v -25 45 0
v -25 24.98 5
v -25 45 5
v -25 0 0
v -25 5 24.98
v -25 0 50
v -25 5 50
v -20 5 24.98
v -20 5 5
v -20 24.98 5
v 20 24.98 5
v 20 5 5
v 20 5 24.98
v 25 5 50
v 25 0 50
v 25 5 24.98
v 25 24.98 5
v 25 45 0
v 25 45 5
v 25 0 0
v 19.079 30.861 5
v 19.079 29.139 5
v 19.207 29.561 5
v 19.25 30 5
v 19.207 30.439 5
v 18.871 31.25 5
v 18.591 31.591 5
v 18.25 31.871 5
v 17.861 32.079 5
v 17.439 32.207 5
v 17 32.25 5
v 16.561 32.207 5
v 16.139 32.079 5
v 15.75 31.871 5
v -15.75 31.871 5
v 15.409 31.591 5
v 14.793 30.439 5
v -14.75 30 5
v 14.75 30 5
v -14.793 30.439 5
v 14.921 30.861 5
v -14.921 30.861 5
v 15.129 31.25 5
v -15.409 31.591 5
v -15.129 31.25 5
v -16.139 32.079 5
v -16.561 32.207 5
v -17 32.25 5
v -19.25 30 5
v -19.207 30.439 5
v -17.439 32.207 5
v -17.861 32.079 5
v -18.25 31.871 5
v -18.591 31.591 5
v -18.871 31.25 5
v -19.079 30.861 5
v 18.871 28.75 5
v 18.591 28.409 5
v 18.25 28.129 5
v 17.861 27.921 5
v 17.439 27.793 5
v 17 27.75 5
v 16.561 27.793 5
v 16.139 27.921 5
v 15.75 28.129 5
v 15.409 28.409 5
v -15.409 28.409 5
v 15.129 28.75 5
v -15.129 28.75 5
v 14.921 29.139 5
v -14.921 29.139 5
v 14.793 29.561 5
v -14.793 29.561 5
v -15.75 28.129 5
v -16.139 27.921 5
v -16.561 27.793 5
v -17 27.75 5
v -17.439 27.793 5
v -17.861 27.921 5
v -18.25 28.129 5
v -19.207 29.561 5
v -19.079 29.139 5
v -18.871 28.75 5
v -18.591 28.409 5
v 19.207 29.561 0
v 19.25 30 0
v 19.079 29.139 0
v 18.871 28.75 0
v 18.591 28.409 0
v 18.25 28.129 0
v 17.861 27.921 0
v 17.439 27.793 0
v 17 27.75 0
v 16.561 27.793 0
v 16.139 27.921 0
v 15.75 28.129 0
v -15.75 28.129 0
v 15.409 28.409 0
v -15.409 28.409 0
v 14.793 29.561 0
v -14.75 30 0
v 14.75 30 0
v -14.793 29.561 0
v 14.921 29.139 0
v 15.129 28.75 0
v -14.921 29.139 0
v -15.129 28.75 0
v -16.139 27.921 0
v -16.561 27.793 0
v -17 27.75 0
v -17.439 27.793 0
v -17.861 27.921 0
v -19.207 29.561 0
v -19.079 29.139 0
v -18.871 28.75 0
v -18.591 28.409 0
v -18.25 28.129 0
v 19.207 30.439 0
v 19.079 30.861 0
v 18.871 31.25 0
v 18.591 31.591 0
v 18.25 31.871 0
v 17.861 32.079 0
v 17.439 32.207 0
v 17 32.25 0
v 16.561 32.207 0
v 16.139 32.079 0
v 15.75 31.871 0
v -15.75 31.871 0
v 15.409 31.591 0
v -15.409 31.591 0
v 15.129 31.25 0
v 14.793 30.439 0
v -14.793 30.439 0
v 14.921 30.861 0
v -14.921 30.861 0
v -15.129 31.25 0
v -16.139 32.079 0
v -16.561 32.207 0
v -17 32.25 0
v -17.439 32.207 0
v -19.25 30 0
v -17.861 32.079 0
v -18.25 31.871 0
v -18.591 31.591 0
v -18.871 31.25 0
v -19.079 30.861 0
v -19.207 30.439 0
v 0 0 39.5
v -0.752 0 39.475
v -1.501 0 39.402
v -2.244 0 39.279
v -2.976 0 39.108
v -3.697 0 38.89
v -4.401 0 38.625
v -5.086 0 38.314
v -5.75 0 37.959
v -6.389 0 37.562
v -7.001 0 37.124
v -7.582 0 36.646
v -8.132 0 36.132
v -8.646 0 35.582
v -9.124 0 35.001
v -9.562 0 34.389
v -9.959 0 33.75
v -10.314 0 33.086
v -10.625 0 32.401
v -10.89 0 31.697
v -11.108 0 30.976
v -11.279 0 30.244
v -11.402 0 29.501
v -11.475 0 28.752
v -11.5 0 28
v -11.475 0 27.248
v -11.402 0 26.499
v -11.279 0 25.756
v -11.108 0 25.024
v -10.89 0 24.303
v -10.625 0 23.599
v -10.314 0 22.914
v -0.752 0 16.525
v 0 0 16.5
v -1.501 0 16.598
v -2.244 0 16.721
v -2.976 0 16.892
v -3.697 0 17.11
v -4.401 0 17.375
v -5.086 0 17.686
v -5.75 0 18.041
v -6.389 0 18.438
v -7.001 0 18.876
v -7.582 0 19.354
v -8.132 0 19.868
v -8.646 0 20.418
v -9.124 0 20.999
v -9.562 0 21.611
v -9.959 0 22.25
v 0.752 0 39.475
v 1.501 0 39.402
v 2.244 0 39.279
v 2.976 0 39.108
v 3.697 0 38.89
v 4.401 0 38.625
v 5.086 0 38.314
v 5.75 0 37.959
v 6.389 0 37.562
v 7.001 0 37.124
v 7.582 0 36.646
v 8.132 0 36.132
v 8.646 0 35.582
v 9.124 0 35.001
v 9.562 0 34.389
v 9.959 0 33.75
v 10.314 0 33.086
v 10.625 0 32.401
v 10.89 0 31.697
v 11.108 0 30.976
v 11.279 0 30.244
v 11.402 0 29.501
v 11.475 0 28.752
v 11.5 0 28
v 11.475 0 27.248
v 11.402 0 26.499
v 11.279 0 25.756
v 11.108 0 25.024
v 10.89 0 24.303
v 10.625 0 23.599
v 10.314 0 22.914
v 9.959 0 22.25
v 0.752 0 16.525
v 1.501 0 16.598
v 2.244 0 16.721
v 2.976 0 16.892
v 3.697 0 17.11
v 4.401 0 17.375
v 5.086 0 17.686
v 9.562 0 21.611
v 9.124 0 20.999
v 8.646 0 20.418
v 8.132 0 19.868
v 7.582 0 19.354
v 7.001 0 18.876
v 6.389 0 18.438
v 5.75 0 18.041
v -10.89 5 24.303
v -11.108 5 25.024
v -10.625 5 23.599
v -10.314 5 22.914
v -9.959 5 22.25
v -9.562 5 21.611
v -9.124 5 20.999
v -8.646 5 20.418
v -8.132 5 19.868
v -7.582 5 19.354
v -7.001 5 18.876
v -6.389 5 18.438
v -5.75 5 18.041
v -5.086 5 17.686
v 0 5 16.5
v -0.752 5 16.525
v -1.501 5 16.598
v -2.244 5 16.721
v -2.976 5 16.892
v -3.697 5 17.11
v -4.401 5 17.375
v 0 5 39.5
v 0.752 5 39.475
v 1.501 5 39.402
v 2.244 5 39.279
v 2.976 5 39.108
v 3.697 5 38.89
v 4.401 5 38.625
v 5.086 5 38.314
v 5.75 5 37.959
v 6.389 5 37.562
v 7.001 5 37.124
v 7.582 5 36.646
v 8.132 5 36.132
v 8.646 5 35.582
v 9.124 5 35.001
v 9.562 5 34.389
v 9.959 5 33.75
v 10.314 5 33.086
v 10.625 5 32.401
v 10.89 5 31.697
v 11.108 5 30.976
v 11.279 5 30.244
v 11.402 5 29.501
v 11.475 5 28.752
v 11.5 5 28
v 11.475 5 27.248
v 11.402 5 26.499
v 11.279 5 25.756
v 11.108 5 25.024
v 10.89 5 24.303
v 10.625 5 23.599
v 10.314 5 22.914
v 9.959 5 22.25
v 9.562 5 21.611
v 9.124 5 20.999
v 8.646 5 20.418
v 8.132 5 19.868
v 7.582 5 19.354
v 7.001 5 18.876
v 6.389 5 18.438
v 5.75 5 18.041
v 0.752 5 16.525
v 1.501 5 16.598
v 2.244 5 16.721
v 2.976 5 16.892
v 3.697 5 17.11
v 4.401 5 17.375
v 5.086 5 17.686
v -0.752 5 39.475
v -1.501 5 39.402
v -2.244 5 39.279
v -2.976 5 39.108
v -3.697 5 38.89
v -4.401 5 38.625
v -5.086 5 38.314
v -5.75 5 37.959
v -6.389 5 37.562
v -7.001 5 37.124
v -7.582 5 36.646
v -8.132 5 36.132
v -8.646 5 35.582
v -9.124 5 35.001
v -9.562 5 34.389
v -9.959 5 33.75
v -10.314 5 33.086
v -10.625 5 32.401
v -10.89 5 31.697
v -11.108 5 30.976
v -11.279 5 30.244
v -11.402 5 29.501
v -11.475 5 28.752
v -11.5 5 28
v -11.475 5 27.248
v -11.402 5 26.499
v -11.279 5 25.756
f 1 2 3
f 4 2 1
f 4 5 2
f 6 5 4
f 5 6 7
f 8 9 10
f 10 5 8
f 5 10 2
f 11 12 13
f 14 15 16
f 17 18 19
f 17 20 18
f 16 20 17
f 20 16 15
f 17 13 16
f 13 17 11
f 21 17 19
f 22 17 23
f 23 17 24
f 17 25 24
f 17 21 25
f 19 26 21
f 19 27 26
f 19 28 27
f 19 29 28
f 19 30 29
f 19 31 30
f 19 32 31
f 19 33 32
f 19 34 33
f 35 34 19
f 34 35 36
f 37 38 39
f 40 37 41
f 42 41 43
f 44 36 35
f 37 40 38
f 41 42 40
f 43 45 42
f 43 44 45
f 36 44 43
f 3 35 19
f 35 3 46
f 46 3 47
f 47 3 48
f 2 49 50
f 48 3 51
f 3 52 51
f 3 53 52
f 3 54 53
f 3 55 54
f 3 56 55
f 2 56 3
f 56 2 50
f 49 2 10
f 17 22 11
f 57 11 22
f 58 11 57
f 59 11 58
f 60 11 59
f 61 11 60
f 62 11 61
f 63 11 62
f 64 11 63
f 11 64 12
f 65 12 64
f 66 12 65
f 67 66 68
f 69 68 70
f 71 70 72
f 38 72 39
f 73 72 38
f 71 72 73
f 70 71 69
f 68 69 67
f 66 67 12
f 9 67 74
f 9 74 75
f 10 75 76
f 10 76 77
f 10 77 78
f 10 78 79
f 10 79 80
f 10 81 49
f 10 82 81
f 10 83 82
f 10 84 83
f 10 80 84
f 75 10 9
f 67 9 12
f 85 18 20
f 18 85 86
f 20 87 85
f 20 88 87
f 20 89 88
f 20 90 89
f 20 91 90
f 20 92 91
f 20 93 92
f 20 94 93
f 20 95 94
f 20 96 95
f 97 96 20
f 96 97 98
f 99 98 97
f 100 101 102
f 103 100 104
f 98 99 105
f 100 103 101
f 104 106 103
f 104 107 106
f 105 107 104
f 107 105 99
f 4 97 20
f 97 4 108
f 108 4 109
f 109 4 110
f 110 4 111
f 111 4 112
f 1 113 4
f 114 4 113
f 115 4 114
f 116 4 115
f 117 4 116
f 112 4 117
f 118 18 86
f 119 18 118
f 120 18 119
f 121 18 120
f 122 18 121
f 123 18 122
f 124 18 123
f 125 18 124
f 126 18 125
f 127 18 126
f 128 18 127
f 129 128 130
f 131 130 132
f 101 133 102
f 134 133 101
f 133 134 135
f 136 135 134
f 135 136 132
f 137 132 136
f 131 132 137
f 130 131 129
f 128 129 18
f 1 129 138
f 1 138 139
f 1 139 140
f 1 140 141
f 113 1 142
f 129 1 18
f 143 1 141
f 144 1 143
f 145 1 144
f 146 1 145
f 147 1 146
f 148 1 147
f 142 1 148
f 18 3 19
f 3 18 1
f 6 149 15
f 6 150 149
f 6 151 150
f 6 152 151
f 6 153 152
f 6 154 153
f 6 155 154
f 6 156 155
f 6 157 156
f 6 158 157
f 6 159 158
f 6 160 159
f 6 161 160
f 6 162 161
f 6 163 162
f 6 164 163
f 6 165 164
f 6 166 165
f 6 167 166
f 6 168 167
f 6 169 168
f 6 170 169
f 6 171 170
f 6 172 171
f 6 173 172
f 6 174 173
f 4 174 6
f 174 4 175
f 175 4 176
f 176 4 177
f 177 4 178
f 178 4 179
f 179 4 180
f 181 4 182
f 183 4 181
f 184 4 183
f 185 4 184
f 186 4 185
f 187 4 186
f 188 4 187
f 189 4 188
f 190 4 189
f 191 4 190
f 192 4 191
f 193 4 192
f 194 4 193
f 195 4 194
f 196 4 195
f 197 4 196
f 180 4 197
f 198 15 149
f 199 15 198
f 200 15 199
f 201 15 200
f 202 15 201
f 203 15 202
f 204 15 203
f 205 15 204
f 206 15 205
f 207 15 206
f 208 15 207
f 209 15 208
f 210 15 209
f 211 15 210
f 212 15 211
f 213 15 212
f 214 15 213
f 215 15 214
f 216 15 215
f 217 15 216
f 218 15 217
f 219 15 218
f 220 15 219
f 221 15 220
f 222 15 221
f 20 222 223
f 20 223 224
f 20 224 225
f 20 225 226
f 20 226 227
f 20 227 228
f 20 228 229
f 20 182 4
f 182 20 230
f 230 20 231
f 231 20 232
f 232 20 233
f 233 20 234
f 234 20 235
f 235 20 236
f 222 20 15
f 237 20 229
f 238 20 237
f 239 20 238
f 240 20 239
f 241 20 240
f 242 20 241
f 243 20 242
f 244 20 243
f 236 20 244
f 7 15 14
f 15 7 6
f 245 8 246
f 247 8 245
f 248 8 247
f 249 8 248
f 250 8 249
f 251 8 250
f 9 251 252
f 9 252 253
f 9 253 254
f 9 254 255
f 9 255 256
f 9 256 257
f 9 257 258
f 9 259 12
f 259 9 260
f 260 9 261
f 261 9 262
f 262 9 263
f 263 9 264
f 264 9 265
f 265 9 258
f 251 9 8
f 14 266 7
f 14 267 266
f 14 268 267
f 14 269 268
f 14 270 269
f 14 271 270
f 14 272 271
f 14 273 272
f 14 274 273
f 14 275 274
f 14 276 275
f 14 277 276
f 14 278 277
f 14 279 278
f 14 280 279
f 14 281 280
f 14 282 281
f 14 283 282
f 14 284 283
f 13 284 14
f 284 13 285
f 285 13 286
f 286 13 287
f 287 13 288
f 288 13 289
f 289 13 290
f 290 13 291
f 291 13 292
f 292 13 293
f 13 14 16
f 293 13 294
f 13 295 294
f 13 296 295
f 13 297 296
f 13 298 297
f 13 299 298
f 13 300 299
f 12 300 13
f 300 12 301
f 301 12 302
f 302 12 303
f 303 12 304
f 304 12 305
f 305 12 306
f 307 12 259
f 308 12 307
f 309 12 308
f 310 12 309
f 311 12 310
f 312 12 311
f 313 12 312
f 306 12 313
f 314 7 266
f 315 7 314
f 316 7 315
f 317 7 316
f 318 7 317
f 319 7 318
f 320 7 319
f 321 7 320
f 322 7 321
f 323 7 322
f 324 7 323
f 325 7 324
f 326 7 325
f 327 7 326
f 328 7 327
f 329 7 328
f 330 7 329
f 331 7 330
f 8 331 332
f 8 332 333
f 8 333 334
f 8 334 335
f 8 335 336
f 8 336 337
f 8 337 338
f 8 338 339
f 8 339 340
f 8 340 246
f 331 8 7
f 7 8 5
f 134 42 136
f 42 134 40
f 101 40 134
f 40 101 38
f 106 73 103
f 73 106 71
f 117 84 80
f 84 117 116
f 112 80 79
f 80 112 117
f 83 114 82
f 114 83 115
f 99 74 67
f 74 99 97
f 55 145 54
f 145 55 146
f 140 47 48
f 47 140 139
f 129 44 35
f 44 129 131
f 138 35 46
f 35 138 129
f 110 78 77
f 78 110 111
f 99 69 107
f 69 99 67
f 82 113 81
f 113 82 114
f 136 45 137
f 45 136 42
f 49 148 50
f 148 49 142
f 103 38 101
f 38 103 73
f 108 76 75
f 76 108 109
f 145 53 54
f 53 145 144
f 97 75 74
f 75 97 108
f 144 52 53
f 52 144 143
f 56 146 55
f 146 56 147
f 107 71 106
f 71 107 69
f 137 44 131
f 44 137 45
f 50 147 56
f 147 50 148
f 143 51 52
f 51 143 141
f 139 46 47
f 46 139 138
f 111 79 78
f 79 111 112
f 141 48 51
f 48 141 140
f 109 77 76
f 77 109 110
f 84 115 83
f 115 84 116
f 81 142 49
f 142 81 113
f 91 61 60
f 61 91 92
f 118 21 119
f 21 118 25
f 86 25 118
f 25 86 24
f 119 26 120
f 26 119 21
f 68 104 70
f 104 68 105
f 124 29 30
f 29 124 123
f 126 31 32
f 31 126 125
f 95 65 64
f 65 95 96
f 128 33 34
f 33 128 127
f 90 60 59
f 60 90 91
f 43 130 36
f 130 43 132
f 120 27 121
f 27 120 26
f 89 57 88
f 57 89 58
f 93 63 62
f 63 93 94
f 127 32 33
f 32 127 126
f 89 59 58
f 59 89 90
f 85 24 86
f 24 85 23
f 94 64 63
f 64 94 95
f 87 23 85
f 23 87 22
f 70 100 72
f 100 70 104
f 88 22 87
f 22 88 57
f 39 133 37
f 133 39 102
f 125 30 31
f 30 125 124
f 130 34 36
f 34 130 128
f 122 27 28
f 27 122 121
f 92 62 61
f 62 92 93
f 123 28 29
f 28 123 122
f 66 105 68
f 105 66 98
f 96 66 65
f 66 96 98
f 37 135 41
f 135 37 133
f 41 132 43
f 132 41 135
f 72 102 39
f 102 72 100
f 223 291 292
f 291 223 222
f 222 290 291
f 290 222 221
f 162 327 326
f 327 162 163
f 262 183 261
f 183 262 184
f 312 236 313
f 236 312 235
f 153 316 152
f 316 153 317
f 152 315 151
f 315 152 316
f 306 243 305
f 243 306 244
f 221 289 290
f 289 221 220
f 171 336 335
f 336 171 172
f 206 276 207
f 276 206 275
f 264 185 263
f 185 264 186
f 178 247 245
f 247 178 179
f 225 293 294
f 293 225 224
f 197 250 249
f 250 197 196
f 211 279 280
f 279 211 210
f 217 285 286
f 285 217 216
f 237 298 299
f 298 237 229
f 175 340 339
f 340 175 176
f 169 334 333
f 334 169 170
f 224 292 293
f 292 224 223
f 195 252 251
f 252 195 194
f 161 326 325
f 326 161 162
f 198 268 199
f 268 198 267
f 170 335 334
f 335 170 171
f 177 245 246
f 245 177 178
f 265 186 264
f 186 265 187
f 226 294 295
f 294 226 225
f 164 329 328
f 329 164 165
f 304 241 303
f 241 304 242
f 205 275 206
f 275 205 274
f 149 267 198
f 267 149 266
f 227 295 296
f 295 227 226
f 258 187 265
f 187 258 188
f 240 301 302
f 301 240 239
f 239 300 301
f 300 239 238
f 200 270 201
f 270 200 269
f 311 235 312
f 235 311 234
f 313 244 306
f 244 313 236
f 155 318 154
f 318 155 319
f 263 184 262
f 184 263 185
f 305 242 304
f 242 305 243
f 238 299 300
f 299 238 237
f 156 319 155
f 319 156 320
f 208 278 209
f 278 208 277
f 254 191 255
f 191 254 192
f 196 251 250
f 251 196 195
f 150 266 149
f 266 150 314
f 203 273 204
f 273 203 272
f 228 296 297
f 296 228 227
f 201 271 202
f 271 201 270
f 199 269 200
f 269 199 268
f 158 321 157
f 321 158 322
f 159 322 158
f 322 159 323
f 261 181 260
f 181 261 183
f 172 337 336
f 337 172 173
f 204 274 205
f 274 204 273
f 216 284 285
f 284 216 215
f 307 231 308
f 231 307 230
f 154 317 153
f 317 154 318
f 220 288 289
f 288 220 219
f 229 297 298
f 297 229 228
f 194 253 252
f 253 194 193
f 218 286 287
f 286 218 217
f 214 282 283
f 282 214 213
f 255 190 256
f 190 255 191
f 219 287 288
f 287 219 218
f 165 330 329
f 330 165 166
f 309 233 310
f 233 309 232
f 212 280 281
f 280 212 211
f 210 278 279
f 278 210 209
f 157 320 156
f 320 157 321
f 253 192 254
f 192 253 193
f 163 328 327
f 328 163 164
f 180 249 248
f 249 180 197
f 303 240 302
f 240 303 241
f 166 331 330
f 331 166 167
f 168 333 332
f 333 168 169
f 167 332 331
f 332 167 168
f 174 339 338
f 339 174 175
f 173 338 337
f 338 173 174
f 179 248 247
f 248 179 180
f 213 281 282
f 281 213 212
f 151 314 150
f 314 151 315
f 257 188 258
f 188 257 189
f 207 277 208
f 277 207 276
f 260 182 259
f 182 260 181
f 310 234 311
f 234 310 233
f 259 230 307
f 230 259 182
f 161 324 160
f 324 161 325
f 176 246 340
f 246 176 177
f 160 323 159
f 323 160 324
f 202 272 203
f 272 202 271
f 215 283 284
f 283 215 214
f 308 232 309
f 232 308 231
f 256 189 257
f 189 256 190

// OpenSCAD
// L-bracket for a NEMA 17 stepper motor (syringe pumps, peristaltic pumps, shakers)
// Category: full hardware. Base plate with two M4 holes, vertical motor plate with
// the 22 mm boss hole + 31 mm M3 pattern, two gussets. Motor body mounts on the
// back (-Y) side, shaft pointing over the base.
// Print: PETG, base on the bed, 0.2 mm layers, 5 perimeters, 30 % infill.
// SPDX-License-Identifier: CERN-OHL-P-2.0

/* [Bracket] */
base = [50, 45, 5];      // X, Y, Z: spans y = 0..45
plate = [50, 5, 50];     // vertical plate at y = 0..5
boss_d = 23;             // NEMA 17 centring boss is 22 mm
boss_z = 28;             // motor axis height
screw_d = 3.4;           // M3 clearance
screw_spacing = 31;      // NEMA 17 bolt pattern
mount_d = 4.5;           // M4 clearance
mount_pos = [[-17, 30], [17, 30]];
gusset_t = 5;
gusset_len = 20;

/* [Hidden] */
eps = 0.01;

difference() {
    union() {
        translate([-base.x / 2, 0, 0]) cube(base);
        translate([-plate.x / 2, 0, 0]) cube(plate);
        for (sx = [-1, 1])
            translate([sx * (base.x / 2 - gusset_t / 2) - gusset_t / 2, plate.y - eps, base.z - eps])
                rotate([90, 0, 90]) linear_extrude(gusset_t)
                    polygon([[0, 0], [gusset_len, 0], [0, gusset_len]]);
    }
    translate([0, -1, boss_z]) rotate([-90, 0, 0]) cylinder(d = boss_d, h = plate.y + 2, $fn = 96);
    for (sx = [], sz = [])
        translate([sx * screw_spacing / 2, -1, boss_z + sz * screw_spacing / 2])
            rotate([-90, 0, 0]) cylinder(d = screw_d, h = plate.y + 2, $fn = 32);
    for (p = mount_pos)
        translate([p.x, p.y, -1]) cylinder(d = mount_d, h = base.z + 2, $fn = 32);
}
